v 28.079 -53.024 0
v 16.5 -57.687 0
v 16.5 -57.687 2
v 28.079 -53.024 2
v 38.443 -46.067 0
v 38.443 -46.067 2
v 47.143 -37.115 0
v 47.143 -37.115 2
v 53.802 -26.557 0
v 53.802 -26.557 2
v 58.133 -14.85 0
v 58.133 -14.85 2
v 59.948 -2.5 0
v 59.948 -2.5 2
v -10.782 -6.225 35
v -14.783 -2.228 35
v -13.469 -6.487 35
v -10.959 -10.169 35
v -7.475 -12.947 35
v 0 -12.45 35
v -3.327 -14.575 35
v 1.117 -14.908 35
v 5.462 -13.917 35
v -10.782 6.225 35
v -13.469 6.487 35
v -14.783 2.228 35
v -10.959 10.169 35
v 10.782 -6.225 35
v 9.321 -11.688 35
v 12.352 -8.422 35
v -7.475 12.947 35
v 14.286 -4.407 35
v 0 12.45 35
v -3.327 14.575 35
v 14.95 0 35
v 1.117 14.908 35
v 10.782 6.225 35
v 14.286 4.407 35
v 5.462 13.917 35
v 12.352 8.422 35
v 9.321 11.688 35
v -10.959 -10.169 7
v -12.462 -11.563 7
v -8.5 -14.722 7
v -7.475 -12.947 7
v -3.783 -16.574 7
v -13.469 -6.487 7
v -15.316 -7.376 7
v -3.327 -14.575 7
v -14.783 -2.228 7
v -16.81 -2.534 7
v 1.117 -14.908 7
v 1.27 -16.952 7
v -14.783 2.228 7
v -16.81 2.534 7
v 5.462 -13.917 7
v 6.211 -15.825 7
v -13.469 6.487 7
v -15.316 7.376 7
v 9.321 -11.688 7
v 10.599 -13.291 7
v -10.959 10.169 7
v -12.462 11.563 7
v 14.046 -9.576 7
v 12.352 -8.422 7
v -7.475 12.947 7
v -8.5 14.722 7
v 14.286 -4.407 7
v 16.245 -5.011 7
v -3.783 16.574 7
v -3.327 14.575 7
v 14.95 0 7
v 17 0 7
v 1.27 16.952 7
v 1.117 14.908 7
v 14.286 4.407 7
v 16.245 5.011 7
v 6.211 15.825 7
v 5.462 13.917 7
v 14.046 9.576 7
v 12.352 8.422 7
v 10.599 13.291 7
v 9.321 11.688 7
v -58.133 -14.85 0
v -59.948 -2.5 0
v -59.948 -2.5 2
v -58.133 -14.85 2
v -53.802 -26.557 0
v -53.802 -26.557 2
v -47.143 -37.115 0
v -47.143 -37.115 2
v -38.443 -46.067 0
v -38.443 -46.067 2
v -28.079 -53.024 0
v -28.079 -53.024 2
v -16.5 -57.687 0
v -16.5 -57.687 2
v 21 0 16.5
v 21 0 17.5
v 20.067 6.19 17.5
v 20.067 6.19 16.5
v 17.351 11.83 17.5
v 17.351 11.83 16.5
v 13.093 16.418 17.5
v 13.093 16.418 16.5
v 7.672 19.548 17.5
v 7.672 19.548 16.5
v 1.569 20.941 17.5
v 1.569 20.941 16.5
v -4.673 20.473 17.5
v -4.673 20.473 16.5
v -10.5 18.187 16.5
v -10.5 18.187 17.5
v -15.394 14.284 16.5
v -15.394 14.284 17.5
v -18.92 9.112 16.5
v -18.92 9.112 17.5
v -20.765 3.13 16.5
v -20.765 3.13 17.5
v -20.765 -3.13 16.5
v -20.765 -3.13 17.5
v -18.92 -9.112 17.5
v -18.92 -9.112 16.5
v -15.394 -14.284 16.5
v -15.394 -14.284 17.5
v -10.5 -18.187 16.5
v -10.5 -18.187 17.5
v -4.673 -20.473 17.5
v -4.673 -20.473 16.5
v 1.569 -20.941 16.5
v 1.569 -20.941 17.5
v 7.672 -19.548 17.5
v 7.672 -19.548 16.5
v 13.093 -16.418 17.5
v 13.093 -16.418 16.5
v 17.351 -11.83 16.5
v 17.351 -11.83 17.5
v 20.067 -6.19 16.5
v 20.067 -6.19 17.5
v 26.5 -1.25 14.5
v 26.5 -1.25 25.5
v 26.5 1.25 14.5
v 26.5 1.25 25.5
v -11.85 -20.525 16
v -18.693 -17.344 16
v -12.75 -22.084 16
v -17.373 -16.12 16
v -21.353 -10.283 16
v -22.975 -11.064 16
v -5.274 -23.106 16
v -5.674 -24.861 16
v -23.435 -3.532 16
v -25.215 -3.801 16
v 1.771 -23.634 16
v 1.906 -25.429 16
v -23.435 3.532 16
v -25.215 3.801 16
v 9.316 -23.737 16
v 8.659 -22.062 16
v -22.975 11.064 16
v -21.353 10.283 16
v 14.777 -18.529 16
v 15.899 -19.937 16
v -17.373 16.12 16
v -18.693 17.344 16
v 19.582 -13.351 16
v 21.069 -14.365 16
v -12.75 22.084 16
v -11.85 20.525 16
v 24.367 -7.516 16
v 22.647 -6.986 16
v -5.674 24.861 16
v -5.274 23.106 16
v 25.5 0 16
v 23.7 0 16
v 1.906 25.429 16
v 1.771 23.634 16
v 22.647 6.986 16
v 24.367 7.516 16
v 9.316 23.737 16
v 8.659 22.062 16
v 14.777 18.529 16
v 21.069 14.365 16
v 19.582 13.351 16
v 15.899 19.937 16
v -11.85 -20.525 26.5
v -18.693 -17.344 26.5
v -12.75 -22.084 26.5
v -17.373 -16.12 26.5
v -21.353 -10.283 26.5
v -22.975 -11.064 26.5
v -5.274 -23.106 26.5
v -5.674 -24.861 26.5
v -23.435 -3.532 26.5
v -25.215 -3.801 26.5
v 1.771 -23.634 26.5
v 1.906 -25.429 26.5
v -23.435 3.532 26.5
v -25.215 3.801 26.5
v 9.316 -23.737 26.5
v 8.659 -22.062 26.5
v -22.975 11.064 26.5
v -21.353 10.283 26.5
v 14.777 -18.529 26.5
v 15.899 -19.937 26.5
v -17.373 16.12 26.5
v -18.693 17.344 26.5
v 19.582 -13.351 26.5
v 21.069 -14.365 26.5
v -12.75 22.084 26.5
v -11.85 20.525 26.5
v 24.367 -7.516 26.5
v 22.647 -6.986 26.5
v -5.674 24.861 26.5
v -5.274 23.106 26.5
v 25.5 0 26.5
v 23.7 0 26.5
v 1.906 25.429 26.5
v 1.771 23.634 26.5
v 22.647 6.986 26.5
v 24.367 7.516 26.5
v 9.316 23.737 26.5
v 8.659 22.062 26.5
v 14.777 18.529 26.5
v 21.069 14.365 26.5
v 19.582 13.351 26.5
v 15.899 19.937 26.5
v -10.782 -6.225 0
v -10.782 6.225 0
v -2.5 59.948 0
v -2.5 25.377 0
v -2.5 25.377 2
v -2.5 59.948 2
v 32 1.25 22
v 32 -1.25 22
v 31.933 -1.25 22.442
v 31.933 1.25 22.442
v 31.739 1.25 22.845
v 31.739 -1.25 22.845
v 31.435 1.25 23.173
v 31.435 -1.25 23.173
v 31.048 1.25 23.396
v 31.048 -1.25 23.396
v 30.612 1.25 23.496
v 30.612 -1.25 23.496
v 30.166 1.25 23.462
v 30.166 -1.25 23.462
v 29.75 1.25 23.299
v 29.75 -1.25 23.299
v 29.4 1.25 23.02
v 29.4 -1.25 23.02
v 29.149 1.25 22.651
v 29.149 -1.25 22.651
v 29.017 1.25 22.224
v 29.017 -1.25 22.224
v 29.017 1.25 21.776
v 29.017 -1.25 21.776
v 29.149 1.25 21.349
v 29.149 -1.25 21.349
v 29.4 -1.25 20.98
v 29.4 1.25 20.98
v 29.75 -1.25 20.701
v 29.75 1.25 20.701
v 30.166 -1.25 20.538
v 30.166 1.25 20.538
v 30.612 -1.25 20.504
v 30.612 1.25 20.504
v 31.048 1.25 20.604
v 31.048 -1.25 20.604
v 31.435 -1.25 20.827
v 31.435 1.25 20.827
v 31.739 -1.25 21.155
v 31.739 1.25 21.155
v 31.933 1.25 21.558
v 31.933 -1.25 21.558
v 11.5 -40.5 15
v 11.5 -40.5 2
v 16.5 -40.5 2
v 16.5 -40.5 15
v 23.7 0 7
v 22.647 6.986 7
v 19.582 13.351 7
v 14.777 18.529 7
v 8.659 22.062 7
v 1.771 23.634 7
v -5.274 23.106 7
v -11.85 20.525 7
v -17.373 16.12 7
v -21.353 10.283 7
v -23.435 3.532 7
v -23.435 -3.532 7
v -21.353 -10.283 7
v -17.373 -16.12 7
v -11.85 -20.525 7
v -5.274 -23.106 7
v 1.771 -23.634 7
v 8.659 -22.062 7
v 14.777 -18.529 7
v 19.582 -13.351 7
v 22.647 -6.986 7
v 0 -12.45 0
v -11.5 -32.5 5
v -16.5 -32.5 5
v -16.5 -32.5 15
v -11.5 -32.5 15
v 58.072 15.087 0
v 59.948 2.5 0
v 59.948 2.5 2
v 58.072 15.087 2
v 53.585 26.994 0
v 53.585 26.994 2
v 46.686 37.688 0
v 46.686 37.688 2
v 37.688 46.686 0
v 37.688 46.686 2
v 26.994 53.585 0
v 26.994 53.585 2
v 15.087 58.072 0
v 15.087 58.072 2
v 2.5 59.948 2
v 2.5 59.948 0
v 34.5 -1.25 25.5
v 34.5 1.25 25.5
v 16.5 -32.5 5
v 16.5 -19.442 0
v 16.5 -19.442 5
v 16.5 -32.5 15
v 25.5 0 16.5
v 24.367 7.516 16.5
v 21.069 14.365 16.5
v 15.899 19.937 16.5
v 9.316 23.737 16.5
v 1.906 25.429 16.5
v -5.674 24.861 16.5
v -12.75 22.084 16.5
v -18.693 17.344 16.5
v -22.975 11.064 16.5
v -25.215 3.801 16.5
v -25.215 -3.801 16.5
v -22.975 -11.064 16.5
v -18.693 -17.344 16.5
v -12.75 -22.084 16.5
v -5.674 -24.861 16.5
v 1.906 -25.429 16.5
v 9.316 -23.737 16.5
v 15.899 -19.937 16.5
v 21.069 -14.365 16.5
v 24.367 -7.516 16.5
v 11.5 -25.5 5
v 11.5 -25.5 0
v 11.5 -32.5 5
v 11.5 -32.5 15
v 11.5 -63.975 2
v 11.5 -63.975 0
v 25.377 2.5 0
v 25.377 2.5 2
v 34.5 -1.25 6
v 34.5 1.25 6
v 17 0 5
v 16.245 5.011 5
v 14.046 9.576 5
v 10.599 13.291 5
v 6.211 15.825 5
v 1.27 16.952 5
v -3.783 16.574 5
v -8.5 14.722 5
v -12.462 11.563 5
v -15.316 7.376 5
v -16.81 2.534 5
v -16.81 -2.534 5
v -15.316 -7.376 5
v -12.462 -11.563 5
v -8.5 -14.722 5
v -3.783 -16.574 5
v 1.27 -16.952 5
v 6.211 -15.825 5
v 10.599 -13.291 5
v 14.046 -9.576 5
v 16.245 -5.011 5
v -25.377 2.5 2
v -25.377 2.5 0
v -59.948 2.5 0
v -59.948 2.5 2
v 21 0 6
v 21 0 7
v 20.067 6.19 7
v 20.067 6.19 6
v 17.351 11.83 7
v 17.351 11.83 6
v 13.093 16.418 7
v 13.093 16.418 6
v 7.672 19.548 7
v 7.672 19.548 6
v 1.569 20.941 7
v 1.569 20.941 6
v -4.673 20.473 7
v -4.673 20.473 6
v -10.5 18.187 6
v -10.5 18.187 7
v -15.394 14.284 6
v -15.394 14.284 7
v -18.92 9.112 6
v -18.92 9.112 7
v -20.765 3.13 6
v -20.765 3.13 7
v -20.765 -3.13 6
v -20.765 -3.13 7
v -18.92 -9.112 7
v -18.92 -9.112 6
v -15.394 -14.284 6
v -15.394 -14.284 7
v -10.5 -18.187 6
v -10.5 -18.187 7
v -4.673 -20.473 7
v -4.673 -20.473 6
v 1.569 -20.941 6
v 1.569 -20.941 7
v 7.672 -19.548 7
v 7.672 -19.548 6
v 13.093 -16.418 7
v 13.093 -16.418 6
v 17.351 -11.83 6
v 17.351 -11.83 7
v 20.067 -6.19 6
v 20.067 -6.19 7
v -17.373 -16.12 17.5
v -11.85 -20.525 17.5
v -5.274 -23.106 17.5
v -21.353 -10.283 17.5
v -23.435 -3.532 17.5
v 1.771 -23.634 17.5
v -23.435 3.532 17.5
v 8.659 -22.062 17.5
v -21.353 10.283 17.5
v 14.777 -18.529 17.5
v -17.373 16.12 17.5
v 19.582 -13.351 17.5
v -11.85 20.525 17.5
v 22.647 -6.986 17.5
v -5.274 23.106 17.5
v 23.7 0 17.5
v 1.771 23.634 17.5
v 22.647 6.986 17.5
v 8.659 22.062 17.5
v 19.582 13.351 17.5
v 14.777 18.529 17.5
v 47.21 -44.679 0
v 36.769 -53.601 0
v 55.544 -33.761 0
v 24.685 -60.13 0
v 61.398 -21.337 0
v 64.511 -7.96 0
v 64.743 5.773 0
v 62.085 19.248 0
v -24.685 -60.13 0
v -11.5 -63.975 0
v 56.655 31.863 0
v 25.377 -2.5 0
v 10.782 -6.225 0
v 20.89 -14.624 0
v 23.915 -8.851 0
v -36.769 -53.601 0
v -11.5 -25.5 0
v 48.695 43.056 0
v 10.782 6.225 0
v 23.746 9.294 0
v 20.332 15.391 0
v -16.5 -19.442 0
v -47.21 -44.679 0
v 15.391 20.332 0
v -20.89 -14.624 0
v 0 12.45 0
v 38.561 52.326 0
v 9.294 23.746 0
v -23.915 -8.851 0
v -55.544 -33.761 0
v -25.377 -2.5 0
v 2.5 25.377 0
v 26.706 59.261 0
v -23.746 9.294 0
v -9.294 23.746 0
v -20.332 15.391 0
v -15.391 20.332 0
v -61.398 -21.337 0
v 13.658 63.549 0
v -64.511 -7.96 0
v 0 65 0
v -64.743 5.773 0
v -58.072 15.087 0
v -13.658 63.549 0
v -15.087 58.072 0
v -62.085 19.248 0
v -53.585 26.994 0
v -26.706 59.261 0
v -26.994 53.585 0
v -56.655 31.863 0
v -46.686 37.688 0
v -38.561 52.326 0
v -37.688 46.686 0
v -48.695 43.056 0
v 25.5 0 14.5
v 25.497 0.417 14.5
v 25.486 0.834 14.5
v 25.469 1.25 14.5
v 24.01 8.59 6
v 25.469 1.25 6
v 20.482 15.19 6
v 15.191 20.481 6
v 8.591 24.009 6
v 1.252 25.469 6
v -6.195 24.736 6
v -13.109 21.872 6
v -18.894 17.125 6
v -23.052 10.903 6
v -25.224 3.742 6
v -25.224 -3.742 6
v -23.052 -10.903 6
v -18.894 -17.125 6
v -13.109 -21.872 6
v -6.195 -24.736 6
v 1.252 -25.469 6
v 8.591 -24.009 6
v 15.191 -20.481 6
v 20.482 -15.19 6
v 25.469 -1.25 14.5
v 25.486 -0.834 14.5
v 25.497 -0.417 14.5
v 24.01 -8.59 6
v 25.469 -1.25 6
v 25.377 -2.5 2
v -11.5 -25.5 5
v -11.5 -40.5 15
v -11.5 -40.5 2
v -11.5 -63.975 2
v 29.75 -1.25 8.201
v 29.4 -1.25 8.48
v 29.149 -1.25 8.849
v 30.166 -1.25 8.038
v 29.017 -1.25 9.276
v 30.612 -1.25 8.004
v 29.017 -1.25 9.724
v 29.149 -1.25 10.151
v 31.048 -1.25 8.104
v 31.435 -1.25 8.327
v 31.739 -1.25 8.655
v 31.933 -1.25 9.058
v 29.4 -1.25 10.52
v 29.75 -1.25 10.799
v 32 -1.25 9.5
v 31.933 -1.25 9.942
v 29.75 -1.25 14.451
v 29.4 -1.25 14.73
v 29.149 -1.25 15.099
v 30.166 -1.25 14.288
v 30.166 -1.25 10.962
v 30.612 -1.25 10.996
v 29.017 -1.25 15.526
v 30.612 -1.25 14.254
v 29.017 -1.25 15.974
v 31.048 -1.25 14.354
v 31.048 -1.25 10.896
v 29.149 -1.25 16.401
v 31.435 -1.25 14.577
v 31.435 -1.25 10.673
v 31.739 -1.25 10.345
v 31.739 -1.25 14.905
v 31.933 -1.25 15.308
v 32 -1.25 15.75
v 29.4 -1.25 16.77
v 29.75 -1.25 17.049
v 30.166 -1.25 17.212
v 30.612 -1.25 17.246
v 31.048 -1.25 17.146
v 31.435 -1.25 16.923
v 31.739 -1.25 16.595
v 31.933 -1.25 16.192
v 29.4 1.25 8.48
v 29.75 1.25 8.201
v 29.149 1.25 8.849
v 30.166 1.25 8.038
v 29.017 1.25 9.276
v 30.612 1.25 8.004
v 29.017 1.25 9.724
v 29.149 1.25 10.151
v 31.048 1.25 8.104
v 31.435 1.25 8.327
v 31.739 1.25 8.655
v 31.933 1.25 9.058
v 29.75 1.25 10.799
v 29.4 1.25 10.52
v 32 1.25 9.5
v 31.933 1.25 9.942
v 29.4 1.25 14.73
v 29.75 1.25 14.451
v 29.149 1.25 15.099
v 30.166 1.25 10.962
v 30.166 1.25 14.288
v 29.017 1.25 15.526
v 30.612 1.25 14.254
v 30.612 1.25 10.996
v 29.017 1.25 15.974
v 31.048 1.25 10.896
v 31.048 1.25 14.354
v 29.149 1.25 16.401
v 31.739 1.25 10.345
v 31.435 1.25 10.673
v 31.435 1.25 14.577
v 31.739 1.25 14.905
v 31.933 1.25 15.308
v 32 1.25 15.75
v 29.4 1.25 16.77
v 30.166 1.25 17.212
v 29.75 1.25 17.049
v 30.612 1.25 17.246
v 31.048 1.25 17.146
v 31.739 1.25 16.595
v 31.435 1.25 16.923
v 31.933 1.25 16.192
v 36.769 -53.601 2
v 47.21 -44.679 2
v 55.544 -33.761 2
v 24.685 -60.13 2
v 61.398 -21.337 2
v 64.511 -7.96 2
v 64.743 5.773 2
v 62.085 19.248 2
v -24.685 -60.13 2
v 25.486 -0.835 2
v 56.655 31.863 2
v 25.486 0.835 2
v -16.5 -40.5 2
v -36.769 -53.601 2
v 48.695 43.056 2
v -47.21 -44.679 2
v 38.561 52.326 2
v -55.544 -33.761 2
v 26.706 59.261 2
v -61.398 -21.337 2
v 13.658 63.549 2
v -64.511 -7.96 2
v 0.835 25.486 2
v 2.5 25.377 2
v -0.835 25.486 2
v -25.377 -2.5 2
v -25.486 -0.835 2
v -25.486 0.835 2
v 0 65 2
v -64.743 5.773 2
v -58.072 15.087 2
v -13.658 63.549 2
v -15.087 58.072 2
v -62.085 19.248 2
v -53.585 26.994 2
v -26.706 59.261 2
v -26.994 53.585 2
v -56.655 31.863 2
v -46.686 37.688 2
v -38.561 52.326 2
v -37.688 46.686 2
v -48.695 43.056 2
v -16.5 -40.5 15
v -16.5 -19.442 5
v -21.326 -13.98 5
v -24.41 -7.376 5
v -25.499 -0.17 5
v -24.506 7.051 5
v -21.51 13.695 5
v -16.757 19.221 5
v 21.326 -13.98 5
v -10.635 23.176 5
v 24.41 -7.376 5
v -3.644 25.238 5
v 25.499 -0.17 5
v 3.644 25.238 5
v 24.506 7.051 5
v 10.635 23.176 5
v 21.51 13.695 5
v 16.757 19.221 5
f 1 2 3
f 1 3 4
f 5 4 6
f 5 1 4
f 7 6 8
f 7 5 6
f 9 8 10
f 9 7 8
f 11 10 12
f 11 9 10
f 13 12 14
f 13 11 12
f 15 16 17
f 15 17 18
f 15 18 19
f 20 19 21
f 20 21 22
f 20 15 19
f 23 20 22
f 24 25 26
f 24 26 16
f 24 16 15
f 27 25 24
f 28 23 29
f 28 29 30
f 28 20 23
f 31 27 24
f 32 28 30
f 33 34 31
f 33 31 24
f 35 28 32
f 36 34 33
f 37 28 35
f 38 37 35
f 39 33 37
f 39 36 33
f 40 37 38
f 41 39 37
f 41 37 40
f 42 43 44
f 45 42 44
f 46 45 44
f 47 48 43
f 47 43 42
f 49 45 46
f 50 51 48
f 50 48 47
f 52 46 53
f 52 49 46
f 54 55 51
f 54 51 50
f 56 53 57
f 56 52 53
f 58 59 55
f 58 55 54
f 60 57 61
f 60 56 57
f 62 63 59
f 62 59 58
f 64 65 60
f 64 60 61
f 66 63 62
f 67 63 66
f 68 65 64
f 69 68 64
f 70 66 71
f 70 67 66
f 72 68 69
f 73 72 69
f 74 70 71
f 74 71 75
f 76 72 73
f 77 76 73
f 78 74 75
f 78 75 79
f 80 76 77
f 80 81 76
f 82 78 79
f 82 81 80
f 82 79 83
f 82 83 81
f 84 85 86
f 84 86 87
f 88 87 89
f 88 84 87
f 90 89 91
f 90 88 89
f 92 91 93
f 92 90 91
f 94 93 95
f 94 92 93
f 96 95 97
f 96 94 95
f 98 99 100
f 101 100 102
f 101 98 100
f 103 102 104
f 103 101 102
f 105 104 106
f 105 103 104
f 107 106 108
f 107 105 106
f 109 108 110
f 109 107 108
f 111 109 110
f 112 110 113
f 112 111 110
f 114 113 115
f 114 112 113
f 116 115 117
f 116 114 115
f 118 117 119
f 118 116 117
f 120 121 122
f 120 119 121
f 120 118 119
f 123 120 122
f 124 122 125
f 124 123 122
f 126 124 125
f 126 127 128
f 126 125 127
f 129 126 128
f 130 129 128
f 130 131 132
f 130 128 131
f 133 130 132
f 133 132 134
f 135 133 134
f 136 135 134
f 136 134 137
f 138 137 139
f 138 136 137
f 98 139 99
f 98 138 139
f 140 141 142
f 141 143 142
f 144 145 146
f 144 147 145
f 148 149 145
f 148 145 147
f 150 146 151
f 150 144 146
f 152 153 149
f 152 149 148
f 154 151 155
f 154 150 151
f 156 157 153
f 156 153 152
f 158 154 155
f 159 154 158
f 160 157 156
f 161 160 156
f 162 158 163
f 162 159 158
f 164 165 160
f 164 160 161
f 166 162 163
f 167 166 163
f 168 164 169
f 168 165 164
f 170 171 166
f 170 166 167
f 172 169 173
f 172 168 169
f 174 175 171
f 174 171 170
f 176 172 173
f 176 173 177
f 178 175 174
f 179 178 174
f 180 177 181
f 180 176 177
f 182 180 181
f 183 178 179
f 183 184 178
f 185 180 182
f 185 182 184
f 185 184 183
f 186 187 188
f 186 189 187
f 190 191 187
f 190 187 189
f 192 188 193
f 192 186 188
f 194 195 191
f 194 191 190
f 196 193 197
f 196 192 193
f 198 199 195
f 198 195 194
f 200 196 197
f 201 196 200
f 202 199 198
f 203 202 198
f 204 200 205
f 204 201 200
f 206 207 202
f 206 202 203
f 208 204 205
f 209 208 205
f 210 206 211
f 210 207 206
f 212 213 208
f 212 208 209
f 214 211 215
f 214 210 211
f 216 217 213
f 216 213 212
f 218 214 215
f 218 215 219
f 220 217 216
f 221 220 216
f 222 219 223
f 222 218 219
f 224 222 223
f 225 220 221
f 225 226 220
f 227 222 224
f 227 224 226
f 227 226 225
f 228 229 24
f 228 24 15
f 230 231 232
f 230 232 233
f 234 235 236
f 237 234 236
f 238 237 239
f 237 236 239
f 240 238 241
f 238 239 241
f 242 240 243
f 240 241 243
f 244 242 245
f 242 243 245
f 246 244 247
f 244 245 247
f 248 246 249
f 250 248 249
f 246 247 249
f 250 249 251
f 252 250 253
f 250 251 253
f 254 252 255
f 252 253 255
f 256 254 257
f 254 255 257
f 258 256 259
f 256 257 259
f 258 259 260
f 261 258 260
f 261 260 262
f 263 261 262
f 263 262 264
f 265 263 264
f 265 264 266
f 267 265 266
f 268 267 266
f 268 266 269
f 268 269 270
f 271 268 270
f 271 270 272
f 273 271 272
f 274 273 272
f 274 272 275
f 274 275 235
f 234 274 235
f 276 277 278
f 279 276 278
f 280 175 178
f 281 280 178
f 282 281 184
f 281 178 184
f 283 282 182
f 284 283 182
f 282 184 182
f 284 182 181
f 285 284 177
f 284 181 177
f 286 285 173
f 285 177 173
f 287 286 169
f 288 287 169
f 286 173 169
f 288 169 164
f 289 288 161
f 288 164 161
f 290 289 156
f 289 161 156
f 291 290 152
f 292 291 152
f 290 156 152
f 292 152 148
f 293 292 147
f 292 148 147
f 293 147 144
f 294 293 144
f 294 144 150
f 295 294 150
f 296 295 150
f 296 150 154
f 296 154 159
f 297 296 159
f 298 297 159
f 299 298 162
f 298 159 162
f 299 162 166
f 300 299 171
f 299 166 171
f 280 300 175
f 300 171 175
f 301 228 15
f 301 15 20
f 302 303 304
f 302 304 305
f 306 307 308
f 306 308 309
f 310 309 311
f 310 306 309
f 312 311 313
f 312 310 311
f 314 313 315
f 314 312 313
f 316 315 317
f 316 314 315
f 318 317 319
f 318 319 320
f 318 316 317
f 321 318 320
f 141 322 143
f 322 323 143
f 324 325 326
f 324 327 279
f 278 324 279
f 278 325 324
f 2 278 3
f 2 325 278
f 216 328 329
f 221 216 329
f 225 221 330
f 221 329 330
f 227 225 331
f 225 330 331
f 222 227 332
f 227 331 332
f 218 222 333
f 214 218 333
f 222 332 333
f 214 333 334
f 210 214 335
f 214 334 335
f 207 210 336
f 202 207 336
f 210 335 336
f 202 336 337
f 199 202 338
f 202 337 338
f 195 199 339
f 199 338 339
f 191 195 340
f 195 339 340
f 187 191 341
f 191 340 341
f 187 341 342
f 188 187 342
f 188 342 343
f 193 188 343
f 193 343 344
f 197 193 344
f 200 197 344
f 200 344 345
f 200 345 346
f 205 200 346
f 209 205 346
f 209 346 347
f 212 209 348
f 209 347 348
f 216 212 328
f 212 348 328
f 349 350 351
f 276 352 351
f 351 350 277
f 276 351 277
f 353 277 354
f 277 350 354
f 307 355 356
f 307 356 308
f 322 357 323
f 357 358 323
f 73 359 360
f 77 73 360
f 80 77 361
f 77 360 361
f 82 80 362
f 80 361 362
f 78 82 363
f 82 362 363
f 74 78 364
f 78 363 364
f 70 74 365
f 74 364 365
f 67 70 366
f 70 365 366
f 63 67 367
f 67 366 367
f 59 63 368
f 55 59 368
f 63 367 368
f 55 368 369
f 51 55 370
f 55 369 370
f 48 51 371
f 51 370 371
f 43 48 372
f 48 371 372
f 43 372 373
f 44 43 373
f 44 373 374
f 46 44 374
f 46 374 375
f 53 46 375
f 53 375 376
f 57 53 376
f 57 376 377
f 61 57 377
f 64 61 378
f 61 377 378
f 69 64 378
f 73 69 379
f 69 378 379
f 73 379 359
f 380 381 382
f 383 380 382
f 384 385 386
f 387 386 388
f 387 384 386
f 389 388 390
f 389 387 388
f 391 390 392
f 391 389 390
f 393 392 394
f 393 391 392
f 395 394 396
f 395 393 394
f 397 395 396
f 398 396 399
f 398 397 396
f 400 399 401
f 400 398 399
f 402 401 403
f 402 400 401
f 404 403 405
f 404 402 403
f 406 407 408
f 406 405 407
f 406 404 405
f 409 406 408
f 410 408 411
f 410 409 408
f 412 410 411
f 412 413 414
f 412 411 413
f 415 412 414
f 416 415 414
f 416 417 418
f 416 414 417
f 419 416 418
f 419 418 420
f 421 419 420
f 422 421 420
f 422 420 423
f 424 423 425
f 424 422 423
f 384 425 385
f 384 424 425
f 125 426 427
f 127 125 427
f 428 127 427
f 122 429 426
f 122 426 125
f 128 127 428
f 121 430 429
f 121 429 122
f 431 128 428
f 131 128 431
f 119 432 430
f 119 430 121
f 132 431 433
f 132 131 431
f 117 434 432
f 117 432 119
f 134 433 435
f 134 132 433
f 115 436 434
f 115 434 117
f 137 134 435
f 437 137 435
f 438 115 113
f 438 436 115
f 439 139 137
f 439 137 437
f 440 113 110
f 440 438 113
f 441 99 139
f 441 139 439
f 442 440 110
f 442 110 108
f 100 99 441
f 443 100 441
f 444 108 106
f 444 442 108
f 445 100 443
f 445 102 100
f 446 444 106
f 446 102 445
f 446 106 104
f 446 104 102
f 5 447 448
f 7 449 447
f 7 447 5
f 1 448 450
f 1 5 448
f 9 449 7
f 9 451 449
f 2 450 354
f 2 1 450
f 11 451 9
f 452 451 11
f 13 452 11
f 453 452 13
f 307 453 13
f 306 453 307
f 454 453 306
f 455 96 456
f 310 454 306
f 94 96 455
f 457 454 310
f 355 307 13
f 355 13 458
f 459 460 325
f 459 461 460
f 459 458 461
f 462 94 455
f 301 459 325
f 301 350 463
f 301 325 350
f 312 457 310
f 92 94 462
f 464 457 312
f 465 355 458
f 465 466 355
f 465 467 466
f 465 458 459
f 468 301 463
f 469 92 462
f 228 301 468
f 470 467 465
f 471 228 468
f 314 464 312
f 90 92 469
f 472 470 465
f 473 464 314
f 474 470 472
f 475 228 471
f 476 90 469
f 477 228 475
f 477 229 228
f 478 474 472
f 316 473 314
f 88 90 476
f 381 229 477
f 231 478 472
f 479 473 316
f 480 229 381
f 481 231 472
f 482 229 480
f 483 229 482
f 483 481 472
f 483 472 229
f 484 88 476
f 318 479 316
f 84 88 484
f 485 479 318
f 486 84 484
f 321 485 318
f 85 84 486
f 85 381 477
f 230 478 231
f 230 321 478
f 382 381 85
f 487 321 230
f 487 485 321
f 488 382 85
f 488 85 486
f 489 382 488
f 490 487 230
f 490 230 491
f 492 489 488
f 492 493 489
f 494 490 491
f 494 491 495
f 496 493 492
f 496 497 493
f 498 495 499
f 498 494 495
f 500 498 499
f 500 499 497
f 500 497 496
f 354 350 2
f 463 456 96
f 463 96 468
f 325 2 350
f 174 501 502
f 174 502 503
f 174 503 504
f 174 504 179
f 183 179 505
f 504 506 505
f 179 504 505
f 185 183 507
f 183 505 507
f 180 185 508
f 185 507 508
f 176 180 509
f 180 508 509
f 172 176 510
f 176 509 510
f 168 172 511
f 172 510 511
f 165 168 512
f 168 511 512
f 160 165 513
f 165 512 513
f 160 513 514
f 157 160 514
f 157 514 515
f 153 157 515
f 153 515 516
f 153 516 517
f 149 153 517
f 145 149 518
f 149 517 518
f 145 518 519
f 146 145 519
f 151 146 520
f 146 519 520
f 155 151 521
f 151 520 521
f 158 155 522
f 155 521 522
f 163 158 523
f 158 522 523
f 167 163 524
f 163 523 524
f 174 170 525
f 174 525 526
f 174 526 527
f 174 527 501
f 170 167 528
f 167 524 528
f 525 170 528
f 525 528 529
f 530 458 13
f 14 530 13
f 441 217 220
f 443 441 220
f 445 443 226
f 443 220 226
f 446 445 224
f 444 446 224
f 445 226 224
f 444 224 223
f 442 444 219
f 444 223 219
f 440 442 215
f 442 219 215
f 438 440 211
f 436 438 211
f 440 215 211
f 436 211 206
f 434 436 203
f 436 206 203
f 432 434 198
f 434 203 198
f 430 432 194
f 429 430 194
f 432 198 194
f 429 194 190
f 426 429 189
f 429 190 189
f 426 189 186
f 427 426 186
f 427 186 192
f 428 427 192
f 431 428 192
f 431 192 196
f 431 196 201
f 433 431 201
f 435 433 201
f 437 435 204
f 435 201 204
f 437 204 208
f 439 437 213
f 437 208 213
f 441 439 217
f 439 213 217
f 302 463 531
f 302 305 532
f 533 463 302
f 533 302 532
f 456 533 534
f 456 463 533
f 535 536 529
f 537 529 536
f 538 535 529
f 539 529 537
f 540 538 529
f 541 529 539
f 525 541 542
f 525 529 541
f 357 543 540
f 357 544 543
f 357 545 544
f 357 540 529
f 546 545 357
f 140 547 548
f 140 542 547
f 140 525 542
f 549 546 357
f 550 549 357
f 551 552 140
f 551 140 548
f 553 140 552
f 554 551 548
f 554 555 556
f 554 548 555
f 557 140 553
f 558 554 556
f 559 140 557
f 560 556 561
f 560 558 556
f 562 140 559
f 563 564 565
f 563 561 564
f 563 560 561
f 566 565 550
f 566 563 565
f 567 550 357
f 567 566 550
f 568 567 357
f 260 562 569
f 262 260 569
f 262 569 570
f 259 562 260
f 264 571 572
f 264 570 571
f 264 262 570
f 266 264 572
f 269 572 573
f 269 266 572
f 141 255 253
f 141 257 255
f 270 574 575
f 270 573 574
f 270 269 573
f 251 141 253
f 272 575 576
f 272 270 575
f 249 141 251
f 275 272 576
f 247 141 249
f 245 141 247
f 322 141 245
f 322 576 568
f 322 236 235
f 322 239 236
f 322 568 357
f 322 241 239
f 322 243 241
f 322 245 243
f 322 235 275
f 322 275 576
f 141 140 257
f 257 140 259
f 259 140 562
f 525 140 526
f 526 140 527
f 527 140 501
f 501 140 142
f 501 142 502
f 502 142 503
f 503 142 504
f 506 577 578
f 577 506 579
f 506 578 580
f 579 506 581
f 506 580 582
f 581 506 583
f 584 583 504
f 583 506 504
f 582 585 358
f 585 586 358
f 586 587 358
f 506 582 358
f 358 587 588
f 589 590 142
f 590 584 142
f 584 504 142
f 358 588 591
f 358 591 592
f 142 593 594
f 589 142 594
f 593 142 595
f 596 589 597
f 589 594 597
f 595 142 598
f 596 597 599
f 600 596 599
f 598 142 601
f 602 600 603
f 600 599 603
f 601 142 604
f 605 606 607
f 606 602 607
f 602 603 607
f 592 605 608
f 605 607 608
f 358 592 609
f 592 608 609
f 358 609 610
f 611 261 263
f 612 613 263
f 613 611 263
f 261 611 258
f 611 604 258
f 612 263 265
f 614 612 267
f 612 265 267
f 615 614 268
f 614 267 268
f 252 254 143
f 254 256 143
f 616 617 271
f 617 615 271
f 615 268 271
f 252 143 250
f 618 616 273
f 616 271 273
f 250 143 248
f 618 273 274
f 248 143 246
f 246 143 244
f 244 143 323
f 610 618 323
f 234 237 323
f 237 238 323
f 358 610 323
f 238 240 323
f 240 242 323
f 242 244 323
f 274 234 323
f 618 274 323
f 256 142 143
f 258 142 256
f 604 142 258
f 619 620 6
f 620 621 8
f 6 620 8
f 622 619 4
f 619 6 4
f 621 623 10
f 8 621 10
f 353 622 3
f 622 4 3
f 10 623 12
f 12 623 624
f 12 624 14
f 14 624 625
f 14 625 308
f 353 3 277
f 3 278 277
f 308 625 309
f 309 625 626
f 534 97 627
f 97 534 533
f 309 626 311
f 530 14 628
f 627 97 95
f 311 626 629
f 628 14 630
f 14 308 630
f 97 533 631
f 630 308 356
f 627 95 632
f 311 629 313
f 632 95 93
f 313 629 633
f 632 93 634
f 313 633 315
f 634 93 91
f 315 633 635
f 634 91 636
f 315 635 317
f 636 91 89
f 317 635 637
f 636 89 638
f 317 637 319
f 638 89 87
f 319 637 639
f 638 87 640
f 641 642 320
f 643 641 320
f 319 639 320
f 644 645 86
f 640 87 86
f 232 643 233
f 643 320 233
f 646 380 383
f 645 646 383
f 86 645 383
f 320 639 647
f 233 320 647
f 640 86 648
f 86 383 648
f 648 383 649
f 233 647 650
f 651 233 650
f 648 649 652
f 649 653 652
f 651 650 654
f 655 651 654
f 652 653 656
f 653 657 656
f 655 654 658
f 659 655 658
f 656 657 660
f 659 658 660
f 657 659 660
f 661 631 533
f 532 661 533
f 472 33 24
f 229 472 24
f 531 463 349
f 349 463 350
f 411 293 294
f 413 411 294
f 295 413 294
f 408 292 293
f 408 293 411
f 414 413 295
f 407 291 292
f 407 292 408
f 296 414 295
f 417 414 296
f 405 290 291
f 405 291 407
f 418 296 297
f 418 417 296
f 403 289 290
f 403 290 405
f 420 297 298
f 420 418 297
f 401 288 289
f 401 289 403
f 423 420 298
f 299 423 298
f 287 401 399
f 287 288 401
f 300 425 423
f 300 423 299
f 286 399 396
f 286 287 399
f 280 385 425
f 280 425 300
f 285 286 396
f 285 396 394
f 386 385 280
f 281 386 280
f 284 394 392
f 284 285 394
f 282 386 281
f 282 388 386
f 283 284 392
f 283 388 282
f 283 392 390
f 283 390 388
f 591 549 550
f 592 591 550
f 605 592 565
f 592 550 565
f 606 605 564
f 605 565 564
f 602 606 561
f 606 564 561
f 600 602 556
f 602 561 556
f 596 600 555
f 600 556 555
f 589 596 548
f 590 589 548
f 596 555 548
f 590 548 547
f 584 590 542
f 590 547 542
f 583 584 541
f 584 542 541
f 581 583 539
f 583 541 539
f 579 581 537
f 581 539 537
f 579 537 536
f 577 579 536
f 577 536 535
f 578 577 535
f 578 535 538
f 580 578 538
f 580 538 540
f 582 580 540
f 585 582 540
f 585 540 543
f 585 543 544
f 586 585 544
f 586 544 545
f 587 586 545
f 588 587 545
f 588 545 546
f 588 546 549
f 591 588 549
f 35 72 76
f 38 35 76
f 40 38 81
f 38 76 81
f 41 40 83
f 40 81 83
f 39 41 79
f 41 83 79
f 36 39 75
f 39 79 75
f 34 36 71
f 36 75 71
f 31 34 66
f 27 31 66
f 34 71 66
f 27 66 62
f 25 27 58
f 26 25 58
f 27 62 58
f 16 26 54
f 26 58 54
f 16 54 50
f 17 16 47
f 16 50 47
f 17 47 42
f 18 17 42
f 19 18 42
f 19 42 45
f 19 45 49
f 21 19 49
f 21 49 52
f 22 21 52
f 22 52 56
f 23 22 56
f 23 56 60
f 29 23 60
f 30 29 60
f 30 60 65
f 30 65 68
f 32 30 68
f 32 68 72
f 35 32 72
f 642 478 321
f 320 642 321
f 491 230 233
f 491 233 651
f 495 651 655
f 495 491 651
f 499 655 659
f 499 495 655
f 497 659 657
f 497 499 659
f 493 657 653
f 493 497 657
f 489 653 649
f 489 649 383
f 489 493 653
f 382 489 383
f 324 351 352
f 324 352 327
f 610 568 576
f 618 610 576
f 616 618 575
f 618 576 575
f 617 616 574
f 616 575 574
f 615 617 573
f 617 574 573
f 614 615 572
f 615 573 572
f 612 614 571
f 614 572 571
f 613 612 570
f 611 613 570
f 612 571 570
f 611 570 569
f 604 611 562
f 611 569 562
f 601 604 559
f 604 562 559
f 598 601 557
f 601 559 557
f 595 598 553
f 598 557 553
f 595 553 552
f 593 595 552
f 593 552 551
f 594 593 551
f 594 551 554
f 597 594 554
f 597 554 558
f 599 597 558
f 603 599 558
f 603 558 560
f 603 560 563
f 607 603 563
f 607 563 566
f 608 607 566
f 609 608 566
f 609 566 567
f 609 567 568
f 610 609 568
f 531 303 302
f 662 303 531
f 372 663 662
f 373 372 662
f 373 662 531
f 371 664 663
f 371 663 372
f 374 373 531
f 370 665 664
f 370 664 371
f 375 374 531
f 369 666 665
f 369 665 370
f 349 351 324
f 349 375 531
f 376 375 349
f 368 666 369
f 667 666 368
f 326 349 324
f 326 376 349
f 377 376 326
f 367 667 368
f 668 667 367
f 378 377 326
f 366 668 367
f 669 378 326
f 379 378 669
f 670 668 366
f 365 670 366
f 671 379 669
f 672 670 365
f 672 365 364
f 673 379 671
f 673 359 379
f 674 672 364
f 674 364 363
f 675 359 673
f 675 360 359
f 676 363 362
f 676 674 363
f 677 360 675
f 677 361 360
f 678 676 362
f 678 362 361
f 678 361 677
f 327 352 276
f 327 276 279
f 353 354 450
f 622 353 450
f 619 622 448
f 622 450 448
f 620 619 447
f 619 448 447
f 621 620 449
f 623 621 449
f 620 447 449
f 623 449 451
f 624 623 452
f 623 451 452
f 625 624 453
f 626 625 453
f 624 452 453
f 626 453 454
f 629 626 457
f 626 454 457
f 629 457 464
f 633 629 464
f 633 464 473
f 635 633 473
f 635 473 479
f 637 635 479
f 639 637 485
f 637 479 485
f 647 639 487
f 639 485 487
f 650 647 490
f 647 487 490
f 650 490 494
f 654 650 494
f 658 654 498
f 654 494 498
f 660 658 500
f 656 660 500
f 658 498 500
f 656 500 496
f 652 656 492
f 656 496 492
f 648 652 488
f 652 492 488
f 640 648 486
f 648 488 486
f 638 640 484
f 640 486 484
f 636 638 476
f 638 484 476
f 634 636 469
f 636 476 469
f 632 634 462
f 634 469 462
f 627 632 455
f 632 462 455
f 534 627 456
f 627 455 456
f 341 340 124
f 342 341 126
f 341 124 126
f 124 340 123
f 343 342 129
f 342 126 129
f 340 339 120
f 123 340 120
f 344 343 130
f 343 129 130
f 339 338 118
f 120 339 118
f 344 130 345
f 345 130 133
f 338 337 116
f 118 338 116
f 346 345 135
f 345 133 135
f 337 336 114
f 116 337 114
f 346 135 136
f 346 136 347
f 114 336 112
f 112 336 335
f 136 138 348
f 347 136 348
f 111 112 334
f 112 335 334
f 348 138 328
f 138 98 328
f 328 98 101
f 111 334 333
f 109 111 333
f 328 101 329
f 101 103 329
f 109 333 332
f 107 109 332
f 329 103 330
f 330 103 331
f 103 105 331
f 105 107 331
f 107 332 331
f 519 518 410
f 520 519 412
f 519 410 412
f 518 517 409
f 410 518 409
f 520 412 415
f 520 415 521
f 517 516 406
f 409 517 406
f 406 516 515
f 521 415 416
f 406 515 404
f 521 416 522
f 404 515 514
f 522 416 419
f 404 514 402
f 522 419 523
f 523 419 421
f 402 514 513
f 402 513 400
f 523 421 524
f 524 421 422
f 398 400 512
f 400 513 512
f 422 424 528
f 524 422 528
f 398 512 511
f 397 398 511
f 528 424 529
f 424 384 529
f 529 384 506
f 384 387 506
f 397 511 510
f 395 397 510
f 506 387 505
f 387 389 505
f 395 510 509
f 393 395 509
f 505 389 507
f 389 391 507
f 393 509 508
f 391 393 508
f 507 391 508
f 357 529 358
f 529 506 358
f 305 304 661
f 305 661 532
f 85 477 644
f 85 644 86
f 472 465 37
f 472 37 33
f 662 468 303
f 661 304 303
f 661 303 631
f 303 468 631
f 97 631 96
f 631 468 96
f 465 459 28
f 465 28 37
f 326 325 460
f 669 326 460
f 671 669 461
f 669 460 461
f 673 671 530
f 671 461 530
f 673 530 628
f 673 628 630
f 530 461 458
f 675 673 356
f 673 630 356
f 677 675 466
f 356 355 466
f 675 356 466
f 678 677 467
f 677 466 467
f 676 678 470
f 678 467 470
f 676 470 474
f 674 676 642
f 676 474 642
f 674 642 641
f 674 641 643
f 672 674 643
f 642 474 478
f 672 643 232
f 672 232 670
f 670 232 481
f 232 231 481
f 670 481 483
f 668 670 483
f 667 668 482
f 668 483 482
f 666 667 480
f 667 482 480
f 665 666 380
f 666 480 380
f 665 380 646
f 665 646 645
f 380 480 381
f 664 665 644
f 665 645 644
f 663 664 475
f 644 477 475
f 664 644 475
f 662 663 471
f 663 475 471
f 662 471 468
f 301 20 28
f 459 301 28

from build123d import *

# Parameters (mm, degrees)
PAD_DEPTH       = 5
SKETCH002_W     = 5
SKETCH002_H     = 8
PAD001_DEPTH    = 10
SKETCH003_R     = 14.95
PAD002_DEPTH    = 30
SKETCH004_R     = 17
PAD003_DEPTH    = 2
POCKET_DEPTH    = 35.001
PAD007_DEPTH    = 2
SKETCH006_R     = 25.5
SKETCH006_R_2   = 21
PAD004_DEPTH    = 10
SKETCH007_R     = 23.7
POCKET001_DEPTH = 9
PAD006_DEPTH    = 1.25
SKETCH011_R     = 1.5
POCKET003_DEPTH = 26.751
SKETCH008_R     = 25.5
SKETCH008_R_2   = 21
PAD005_DEPTH    = 10
SKETCH009_R     = 23.7
POCKET002_DEPTH = 9


with BuildPart() as basis:
    # Sketch → Pad (new body)
    with BuildSketch(Plane.XY):
        with BuildLine():
            Line((-16.5, -19.442222), (-16.5, -40.5))
            Line((-16.5, -40.5), (-11.5, -40.5))
            Line((-11.5, -40.5), (-11.5, -25.5))
            Line((-11.5, -25.5), (11.5, -25.5))
            Line((11.5, -25.5), (11.5, -40.5))
            Line((11.5, -40.5), (16.5, -40.5))
            Line((16.5, -40.5), (16.5, -19.442222))
            ThreePointArc((16.5, -19.442222), (0, 25.5), (-16.5, -19.442222))
        make_face()
    extrude(amount=PAD_DEPTH)

    # Sketch002 (on Face10 of Pad) → Pad001 (join)
    with BuildSketch(Plane.XY.offset(5)):
        with Locations((-14, -36.5)):
            Rectangle(SKETCH002_W, SKETCH002_H)
        with Locations((14, -36.5)):
            Rectangle(SKETCH002_W, SKETCH002_H)
    extrude(amount=PAD001_DEPTH)

    # Sketch003 (on Face5 of Pad001) → Pad002 (join)
    with BuildSketch(Plane.XY.offset(5)):
        Circle(SKETCH003_R)
    extrude(amount=PAD002_DEPTH)

    # Sketch004 (on Face5 of Pad002) → Pad003 (join)
    with BuildSketch(Plane.XY.offset(5)):
        Circle(SKETCH004_R)
    extrude(amount=PAD003_DEPTH)

    # Sketch005 (on Face24 of Pad003) → Pocket (cut, through all)
    with BuildSketch(Plane.XY.offset(35)):
        Polygon((10.782016, -6.225), (10.782016, 6.225), (0, 12.45), (-10.782016, 6.225), (-10.782016, -6.225), (0, -12.45), align=None)
    extrude(amount=-POCKET_DEPTH, mode=Mode.SUBTRACT)

    # Sketch012 → Pad007 (join)
    with BuildSketch(Plane.XY):
        with BuildLine():
            ThreePointArc((16.5, -57.686654), (47.142993, -37.115202), (59.947894, -2.5))
            Line((25.377155, -2.5), (59.947894, -2.5))
            ThreePointArc((25.377155, -2.5), (25.5, 0), (25.377155, 2.5))
            Line((25.377155, 2.5), (59.947894, 2.5))
            ThreePointArc((59.947894, 2.5), (42.426407, 42.426407), (2.5, 59.947894))
            Line((2.5, 25.377155), (2.5, 59.947894))
            ThreePointArc((2.5, 25.377155), (0, 25.5), (-2.5, 25.377155))
            Line((-2.5, 25.377155), (-2.5, 59.947894))
            ThreePointArc((-2.5, 59.947894), (-42.426407, 42.426407), (-59.947894, 2.5))
            Line((-25.377155, 2.5), (-59.947894, 2.5))
            ThreePointArc((-25.377155, 2.5), (-25.5, 0), (-25.377155, -2.5))
            Line((-25.377155, -2.5), (-59.947894, -2.5))
            ThreePointArc((-59.947894, -2.5), (-47.142993, -37.115202), (-16.5, -57.686654))
            Line((-16.5, -40.5), (-16.5, -57.686654))
            Line((-16.5, -40.5), (-11.5, -40.5))
            Line((-11.5, -40.5), (-11.5, -63.974604))
            ThreePointArc((11.5, -63.974604), (0, 65), (-11.5, -63.974604))
            Line((11.5, -40.5), (11.5, -63.974604))
            Line((11.5, -40.5), (16.5, -40.5))
            Line((16.5, -40.5), (16.5, -57.686654))
        make_face()
    extrude(amount=PAD007_DEPTH)


with BuildPart() as lowerring:
    # Sketch006 (on DatumPlane) → Pad004 (new body)
    with BuildSketch(Plane.XY.offset(6)):
        Circle(SKETCH006_R)
        Circle(SKETCH006_R_2, mode=Mode.SUBTRACT)
    extrude(amount=PAD004_DEPTH)

    # Sketch007 (on Face4 of Pad004) → Pocket001 (cut)
    with BuildSketch(Plane.XY.offset(16)):
        Circle(SKETCH007_R)
    extrude(amount=-POCKET001_DEPTH, mode=Mode.SUBTRACT)

    # Sketch010 (on DatumPlane) → Pad006 (join, symmetric)
    with BuildSketch(Plane(origin=(24.5, 0, 6), x_dir=(-1, 0, 0), z_dir=(0, 1, 0))):
        Polygon((0, 0), (-10, 0), (-10, 19.5), (-2, 19.5), (-2, 8.5), (0, 8.5), align=None)
    extrude(amount=PAD006_DEPTH, both=True)

    # Sketch011 (on Face4 of Pad006) → Pocket003 (cut, through all)
    with BuildSketch(Plane(origin=(0, -1.25, 6), x_dir=(1, 0, 0), z_dir=(0, -1, 0))):
        with Locations((30.5, 16)):
            Circle(SKETCH011_R)
        with Locations((30.5, 9.75)):
            Circle(SKETCH011_R)
        with Locations((30.5, 3.5)):
            Circle(SKETCH011_R)
    extrude(amount=-POCKET003_DEPTH, mode=Mode.SUBTRACT)


with BuildPart() as upperring:
    # Sketch008 (on DatumPlane) → Pad005 (new body)
    with BuildSketch(Plane.XY.offset(16.5)):
        Circle(SKETCH008_R)
        Circle(SKETCH008_R_2, mode=Mode.SUBTRACT)
    extrude(amount=PAD005_DEPTH)

    # Sketch009 (on Face4 of Pad005) → Pocket002 (cut)
    with BuildSketch(Plane.XY.offset(26.5)):
        Circle(SKETCH009_R)
    extrude(amount=-POCKET002_DEPTH, mode=Mode.SUBTRACT)


solid = Compound([basis.part, lowerring.part, upperring.part])
